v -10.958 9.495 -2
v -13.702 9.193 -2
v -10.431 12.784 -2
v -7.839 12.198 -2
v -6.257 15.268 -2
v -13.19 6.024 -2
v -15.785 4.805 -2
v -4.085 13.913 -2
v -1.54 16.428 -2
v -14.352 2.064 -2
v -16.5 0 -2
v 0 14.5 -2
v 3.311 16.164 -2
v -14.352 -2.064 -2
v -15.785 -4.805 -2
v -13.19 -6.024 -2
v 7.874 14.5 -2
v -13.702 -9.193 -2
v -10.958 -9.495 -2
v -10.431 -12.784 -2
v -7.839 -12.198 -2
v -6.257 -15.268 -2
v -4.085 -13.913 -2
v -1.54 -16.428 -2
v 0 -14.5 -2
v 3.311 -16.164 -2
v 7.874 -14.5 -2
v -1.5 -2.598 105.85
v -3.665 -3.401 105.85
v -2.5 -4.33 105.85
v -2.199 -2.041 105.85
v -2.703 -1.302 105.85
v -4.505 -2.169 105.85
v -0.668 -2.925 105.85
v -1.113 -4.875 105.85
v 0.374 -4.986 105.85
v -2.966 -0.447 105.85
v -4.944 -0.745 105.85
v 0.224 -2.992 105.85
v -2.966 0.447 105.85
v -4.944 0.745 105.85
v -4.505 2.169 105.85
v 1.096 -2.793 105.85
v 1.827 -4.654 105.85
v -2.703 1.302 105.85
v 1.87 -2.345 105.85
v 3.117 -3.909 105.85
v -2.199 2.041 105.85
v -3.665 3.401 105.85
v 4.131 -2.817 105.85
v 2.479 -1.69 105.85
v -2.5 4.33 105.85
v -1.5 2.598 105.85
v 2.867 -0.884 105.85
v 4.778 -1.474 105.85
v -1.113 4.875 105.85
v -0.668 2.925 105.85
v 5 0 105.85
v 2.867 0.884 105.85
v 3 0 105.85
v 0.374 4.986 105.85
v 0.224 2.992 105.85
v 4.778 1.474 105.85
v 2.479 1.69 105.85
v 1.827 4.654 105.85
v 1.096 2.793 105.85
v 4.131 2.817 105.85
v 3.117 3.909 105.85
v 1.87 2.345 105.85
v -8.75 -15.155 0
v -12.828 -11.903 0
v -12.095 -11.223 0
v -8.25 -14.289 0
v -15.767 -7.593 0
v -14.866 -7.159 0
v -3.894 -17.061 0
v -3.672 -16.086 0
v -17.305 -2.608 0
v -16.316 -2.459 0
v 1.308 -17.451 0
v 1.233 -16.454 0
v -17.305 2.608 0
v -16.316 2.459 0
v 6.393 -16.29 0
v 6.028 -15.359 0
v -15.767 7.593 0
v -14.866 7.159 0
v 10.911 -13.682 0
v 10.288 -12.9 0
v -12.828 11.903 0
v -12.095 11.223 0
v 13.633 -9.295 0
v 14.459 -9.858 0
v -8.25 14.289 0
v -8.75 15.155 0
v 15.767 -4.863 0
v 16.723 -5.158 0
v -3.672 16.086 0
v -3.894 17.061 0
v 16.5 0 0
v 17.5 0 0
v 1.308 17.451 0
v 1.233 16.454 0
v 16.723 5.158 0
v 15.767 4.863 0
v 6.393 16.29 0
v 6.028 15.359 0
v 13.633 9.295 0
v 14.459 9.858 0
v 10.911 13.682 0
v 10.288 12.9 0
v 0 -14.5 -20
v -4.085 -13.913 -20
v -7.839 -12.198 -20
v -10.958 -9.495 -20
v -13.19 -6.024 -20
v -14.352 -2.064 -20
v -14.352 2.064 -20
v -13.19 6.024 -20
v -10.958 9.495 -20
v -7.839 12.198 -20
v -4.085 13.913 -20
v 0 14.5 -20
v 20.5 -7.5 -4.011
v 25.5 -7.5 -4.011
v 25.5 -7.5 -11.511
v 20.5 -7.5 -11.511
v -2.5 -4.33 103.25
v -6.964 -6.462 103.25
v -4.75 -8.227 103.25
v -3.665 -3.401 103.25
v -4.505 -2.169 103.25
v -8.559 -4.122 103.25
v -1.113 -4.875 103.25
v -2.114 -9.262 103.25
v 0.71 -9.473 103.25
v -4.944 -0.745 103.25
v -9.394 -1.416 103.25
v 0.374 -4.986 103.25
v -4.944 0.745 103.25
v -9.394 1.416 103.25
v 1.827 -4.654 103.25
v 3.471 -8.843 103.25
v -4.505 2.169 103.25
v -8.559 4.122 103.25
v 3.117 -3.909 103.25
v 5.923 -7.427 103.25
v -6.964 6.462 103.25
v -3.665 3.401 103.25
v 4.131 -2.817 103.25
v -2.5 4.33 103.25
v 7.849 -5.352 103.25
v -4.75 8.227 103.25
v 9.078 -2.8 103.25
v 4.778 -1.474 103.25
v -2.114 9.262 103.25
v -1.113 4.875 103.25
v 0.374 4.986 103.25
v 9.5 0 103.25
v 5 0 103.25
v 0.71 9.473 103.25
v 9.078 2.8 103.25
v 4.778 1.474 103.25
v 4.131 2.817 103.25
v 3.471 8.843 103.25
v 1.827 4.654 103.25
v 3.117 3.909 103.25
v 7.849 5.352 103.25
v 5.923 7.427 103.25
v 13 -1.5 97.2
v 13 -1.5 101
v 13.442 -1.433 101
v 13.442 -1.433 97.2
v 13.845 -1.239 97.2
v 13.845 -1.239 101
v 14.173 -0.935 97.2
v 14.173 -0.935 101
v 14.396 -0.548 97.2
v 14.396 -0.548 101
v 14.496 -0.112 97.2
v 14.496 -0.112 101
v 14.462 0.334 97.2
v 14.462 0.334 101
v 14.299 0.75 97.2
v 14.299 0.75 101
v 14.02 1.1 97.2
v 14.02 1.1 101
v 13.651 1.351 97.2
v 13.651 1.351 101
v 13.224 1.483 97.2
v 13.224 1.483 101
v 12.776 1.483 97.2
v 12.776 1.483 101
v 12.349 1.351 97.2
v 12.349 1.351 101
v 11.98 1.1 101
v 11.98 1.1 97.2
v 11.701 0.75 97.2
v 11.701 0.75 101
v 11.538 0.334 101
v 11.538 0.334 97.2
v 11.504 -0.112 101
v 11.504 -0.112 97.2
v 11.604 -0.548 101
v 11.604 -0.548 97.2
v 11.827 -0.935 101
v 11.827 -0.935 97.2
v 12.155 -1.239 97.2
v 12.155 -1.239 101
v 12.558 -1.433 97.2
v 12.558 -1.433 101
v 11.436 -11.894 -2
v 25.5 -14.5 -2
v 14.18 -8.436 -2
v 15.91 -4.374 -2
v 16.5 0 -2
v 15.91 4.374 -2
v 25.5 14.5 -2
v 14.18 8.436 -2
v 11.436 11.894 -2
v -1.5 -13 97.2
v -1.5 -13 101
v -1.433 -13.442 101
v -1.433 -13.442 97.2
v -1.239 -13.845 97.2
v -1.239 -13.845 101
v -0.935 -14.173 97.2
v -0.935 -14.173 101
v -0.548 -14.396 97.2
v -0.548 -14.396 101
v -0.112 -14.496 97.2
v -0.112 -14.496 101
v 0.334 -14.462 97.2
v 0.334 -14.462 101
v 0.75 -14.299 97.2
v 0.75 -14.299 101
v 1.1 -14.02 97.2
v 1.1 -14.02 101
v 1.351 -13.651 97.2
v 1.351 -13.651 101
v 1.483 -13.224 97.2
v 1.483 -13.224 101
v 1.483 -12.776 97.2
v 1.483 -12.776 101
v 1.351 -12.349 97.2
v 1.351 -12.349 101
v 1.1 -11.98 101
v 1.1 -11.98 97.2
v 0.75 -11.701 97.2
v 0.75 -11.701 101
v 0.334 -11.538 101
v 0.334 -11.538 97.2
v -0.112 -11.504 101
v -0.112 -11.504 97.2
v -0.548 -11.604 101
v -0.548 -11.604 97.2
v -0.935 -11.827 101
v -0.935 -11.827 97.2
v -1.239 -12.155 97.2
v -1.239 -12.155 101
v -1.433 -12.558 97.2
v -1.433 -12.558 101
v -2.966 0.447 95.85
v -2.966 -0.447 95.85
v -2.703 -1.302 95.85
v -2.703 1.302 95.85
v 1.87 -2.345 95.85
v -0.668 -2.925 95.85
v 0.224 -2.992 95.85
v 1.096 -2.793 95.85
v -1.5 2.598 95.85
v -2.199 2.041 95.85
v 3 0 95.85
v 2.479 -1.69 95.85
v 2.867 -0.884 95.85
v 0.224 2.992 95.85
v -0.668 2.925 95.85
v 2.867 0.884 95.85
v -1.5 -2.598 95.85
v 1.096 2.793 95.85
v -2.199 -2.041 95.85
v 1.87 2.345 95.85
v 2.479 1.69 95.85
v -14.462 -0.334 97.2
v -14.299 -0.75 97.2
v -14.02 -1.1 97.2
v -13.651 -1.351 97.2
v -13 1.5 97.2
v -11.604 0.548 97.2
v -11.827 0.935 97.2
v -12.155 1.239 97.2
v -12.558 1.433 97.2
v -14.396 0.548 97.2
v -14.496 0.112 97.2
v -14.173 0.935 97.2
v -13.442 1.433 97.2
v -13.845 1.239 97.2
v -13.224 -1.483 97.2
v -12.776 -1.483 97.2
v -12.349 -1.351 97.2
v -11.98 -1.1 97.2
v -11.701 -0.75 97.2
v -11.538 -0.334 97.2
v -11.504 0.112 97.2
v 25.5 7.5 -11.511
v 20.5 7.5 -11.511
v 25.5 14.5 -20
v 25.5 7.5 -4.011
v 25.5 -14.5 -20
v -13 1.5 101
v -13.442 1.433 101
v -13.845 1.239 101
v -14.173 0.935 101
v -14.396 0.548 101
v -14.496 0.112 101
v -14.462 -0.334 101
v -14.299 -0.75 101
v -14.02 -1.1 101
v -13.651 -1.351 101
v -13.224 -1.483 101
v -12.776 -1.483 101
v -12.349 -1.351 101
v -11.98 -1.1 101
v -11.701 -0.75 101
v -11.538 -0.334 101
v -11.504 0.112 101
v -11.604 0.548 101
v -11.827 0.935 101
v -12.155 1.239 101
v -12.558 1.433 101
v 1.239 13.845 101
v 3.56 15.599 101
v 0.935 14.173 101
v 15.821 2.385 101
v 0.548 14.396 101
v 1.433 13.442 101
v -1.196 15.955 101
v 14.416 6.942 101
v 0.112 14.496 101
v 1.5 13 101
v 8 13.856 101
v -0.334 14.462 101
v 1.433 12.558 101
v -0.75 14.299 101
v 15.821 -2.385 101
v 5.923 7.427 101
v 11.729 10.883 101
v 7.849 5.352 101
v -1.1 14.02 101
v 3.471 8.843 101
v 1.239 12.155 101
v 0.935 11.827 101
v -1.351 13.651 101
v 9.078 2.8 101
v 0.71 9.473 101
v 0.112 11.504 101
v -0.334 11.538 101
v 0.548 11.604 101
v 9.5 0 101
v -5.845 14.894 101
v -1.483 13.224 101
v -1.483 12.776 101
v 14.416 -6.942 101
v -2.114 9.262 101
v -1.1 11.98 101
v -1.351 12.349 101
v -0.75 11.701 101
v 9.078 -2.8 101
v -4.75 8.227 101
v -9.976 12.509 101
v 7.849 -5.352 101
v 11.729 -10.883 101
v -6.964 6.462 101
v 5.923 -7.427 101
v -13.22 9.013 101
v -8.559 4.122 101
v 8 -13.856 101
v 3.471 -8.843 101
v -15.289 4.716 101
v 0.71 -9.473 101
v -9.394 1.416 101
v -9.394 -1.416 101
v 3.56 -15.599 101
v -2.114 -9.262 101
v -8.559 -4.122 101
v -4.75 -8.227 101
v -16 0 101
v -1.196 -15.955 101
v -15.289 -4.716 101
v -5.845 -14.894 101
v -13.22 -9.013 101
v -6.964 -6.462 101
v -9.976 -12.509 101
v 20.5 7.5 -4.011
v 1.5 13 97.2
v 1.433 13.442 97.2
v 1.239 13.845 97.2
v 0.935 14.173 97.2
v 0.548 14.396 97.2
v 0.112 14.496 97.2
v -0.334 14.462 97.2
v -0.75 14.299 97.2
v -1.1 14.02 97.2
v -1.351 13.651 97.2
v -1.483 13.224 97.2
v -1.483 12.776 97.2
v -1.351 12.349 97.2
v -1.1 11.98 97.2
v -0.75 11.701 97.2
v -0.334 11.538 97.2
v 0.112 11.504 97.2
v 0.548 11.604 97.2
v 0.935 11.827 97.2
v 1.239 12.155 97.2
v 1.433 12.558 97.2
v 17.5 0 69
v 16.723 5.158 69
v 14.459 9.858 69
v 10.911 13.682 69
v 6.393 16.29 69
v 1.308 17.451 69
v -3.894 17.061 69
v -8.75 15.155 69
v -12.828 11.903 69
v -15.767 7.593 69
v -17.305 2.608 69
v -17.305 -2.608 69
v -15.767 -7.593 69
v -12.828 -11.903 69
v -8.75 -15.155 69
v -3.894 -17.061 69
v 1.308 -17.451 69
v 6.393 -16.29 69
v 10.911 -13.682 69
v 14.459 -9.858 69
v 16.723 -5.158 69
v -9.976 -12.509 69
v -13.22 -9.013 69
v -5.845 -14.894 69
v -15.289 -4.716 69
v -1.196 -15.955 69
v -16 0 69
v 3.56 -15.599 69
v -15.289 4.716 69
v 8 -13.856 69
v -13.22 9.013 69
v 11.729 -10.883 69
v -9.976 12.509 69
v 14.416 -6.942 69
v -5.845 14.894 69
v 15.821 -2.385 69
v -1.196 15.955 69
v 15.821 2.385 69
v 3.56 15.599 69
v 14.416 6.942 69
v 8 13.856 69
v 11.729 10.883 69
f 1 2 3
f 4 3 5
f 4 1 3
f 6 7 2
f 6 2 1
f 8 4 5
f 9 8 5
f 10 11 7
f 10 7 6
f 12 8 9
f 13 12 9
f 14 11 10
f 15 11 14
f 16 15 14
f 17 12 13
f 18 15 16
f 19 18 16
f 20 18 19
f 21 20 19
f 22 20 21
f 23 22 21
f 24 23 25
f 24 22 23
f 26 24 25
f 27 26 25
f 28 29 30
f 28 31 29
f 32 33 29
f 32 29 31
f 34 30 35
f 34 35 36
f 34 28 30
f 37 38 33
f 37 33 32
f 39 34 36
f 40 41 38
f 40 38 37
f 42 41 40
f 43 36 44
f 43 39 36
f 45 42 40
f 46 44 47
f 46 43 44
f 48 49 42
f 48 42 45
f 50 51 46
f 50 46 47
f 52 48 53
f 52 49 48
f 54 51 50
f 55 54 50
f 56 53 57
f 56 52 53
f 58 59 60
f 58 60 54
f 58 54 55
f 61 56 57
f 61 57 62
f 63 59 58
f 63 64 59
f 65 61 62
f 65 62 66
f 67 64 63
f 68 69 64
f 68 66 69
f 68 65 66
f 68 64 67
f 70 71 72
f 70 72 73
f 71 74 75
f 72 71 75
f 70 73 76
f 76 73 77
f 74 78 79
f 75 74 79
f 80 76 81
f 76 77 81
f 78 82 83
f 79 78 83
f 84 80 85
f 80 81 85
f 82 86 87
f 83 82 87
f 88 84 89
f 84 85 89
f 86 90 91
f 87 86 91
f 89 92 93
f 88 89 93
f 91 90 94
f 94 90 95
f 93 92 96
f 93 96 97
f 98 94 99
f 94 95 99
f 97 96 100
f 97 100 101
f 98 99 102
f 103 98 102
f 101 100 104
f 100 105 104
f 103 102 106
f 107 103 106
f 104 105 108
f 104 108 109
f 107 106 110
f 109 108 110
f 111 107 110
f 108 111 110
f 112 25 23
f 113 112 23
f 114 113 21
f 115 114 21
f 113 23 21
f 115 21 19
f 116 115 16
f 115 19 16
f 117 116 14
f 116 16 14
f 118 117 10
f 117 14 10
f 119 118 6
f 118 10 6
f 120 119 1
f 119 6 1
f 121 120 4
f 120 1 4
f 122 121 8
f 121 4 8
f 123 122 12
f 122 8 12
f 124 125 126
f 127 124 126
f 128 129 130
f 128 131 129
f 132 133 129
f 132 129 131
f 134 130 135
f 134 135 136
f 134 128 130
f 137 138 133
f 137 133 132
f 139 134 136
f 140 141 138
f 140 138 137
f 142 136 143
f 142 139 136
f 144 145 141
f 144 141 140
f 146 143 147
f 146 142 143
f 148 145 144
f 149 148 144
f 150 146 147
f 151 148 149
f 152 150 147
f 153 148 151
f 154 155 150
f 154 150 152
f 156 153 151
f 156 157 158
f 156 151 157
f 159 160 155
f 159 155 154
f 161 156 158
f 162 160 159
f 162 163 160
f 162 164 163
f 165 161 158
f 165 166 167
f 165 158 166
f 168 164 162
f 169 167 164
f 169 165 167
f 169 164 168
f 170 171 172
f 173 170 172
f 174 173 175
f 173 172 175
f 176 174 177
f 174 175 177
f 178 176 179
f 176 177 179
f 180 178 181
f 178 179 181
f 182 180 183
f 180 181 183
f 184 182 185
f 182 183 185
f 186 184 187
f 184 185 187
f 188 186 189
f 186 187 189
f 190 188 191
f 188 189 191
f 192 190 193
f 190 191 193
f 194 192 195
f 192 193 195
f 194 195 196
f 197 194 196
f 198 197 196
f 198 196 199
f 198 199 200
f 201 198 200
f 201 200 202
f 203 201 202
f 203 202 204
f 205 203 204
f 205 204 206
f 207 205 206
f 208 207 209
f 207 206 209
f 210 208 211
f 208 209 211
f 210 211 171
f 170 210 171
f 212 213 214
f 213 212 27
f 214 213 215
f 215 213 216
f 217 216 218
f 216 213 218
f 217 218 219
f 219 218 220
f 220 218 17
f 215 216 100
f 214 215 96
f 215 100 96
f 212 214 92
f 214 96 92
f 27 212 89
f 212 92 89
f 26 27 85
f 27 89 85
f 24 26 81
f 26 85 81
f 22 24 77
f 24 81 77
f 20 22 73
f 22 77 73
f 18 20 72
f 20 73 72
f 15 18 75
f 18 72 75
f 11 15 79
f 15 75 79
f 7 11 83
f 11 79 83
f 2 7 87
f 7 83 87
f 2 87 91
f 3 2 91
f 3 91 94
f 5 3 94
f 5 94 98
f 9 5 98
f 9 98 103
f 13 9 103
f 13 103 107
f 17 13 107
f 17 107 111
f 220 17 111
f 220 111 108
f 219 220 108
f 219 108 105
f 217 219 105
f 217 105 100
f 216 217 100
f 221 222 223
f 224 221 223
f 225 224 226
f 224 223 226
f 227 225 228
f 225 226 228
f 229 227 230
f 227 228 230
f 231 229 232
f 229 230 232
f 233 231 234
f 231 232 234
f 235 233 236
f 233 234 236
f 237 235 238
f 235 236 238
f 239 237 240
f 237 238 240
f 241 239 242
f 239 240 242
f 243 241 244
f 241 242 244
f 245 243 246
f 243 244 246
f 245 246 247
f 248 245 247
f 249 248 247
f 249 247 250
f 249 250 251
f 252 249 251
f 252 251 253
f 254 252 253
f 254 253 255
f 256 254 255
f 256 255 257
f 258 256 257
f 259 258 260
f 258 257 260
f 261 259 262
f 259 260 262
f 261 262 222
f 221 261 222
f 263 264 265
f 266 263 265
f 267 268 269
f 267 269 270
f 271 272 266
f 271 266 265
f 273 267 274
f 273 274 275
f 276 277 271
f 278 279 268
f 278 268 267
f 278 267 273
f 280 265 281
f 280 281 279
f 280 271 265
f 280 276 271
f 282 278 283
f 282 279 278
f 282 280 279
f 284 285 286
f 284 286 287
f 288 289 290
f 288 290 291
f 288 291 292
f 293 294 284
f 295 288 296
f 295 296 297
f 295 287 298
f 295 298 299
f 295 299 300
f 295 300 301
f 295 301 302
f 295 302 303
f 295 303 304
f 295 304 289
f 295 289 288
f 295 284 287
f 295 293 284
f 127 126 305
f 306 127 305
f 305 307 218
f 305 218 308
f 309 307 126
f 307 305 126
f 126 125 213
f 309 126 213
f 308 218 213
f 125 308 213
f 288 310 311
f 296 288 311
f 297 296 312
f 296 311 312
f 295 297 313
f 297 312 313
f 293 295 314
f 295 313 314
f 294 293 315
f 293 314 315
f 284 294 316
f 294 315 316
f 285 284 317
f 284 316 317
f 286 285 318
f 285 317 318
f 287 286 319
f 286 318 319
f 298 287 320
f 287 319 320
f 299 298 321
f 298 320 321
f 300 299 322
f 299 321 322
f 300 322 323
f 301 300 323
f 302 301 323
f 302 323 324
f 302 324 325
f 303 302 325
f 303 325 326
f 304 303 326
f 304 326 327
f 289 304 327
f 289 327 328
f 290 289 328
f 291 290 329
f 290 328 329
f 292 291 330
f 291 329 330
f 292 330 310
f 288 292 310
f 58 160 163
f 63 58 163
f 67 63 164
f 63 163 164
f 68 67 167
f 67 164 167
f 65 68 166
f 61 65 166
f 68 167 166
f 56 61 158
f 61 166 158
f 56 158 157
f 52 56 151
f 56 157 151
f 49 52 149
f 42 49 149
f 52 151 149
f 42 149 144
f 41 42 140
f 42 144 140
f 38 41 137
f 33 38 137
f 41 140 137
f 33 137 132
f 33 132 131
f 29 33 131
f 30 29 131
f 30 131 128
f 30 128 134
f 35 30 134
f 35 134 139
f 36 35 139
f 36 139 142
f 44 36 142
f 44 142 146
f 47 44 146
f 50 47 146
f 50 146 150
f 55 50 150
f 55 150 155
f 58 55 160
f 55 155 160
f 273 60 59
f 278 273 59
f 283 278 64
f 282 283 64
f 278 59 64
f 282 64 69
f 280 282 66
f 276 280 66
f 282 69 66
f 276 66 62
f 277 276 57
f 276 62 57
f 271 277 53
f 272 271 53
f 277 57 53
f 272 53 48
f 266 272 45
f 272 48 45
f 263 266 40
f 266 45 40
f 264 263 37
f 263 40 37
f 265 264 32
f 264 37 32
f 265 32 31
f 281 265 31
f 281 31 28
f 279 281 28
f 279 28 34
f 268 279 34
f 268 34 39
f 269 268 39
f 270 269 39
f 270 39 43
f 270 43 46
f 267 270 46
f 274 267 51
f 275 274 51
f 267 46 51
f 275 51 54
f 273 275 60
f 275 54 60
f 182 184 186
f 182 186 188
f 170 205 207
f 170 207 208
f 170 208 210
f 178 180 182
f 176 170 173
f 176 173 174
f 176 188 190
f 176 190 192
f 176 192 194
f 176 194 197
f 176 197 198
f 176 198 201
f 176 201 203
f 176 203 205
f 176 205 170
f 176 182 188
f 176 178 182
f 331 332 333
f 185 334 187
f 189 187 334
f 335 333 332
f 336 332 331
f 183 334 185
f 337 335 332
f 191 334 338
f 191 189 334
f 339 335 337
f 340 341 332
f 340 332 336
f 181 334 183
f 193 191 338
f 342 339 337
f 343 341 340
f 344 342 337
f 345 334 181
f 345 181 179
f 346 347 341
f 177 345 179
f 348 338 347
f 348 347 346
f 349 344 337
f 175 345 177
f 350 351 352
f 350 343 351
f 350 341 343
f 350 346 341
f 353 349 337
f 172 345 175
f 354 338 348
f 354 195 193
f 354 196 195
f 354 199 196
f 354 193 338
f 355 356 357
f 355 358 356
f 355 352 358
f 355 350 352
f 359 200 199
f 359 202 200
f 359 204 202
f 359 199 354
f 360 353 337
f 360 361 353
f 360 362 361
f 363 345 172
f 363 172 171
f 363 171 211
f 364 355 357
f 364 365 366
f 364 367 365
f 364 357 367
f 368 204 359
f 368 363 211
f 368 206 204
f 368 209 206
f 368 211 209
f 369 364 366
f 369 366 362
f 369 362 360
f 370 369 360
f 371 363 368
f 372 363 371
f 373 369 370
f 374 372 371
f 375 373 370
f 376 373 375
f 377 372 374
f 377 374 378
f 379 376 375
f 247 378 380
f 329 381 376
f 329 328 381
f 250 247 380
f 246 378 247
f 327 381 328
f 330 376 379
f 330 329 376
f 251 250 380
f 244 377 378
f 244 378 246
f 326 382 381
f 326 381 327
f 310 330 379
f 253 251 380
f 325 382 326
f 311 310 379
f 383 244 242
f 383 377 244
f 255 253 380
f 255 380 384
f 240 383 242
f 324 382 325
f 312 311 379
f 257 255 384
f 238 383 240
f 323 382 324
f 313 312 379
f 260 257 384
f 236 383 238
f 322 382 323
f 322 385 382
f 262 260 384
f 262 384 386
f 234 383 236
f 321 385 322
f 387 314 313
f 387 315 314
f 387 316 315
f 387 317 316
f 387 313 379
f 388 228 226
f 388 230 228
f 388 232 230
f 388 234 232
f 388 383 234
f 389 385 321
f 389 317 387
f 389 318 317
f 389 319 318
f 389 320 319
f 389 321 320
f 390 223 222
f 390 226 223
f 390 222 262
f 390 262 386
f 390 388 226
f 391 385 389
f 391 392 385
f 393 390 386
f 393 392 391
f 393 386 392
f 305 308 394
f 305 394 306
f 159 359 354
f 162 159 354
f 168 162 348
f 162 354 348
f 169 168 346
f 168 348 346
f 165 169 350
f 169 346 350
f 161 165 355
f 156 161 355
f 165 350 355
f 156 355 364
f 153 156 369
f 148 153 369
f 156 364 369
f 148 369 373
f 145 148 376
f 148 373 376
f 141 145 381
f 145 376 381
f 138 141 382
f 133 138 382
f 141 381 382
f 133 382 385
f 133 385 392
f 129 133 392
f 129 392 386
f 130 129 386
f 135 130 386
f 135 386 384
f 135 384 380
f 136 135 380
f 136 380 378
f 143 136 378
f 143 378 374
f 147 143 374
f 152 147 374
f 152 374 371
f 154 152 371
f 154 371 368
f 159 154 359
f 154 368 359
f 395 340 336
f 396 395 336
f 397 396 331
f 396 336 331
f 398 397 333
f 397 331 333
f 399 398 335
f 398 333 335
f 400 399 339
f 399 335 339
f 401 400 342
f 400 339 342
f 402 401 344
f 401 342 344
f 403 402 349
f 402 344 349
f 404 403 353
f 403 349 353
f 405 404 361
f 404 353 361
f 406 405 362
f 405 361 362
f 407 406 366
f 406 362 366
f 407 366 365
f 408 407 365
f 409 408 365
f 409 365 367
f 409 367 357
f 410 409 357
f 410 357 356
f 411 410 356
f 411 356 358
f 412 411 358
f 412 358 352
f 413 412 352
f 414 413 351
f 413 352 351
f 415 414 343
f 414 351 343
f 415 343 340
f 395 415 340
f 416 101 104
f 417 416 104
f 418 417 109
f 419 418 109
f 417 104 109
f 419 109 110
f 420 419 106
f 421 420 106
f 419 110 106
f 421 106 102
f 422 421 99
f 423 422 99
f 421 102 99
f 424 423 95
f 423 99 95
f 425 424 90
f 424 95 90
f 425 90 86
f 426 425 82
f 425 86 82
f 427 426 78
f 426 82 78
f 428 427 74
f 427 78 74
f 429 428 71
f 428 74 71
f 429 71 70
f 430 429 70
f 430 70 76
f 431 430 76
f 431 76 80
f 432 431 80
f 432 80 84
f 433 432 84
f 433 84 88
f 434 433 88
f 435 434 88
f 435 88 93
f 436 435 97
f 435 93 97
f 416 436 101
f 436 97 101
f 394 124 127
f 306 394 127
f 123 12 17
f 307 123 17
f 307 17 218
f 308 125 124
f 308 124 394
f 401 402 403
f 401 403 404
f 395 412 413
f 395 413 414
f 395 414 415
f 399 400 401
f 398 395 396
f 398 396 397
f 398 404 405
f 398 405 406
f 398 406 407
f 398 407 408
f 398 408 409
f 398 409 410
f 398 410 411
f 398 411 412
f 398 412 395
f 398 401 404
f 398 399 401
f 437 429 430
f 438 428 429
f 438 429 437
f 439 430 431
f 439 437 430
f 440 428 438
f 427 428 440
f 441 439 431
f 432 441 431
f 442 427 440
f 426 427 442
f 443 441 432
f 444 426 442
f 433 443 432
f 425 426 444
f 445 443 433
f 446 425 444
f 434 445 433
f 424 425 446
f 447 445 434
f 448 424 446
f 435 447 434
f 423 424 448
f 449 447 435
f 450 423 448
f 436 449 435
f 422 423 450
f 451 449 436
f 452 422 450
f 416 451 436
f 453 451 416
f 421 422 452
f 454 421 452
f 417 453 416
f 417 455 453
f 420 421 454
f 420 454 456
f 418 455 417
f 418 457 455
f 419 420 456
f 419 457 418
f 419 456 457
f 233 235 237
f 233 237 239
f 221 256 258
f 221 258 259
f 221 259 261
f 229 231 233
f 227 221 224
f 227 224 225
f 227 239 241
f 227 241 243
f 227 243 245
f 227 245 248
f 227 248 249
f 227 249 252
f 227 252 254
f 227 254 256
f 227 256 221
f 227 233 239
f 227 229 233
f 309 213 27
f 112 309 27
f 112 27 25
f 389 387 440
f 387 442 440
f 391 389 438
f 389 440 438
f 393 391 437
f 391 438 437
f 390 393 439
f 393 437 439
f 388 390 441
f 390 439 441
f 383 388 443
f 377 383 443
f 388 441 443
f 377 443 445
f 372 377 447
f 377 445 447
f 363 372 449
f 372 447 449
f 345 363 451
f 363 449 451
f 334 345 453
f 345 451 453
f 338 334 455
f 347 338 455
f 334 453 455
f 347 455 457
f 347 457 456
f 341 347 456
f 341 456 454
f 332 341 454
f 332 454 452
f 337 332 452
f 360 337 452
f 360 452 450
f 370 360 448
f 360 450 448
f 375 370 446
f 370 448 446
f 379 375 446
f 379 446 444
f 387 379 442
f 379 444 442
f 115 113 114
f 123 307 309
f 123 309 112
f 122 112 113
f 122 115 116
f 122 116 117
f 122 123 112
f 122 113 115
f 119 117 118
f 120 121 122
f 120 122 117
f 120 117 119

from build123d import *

# Parameters (mm, degrees)
SKETCH_1_R               = 17.5
EXTRUDE_1_DEPTH          = 69
SKETCH_2_R               = 16
EXTRUDE_2_DEPTH          = 26
SKETCH_3_R               = 16
EXTRUDE_3_DEPTH          = 6
SKETCH_4_R               = 9.5
EXTRUDE_4_DEPTH          = 2.25
SKETCH_5_R               = 5
EXTRUDE_5_DEPTH          = 2.6
SKETCH_8_R               = 16.5
EXTRUDE_7_DEPTH          = 2
EXTRUDE_8_DEPTH          = 18
SKETCH_10_W              = 7.5
SKETCH_10_H              = 15
CUT_EXTRUDE_2_DEPTH      = 5
SKETCH_7_R               = 1.5
CUT_EXTRUDE_1_DEPTH      = 3.8
PATTERN_CIRCULAR_1_COUNT = 4
SKETCH_6_R               = 3
CUT_EXTRUDE_3_DEPTH      = 10


with BuildPart() as part:
    # 스케치1 → 보스-돌출1 (new body)
    with BuildSketch(Plane.XY):
        Circle(SKETCH_1_R)
    extrude(amount=EXTRUDE_1_DEPTH)

    # 스케치2 → 보스-돌출2 (add)
    with BuildSketch(Plane.XY.offset(69)):
        with Locations(Location((0, 0, 0), (0, 0, 180))):
            Circle(SKETCH_2_R)
    extrude(amount=EXTRUDE_2_DEPTH)

    # 스케치3 → 보스-돌출3 (add)
    with BuildSketch(Plane.XY.offset(95)):
        with Locations(Location((0, 0, 0), (0, 0, 180))):
            Circle(SKETCH_3_R)
    extrude(amount=EXTRUDE_3_DEPTH)

    # 스케치4 → 보스-돌출4 (add)
    with BuildSketch(Plane.XY.offset(101)):
        Circle(SKETCH_4_R)
    extrude(amount=EXTRUDE_4_DEPTH)

    # 스케치5 → 보스-돌출5 (add)
    with BuildSketch(Plane.XY.offset(103.25)):
        Circle(SKETCH_5_R)
    extrude(amount=EXTRUDE_5_DEPTH)

    # 스케치8 → 보스-돌출7 (add)
    with BuildSketch(Plane(origin=(0, 0, 0), x_dir=(-1, 0, 0), z_dir=(0, 0, -1))):
        with Locations(Location((0, 0, 0), (0, 0, 180))):
            Circle(SKETCH_8_R)
    extrude(amount=EXTRUDE_7_DEPTH)

    # 스케치9 → 보스-돌출8 (add)
    with BuildSketch(Plane(origin=(0, 0, -2), x_dir=(-1, 0, 0), z_dir=(0, 0, -1))):
        with BuildLine():
            Line((0, 14.5), (-25.5, 14.5))
            Line((-25.5, 14.5), (-25.5, -14.5))
            Line((-25.5, -14.5), (0, -14.5))
            ThreePointArc((0, -14.5), (14.5, 0), (0, 14.5))
        make_face()
    extrude(amount=EXTRUDE_8_DEPTH)

    # 스케치10 → 컷-돌출2 (cut)
    with BuildSketch(Plane(origin=(25.5, 0, 0), x_dir=(0, 0, -1), z_dir=(1, 0, 0))):
        with Locations((7.760897897, 0)):
            Rectangle(SKETCH_10_W, SKETCH_10_H)
    extrude(amount=-CUT_EXTRUDE_2_DEPTH, mode=Mode.SUBTRACT)

    # 스케치7 → 컷-돌출1 (cut)
    with BuildSketch(Plane.XY.offset(101)):
        with Locations((0, 13)):
            Circle(SKETCH_7_R)
    cut_extrude_1 = extrude(amount=-CUT_EXTRUDE_1_DEPTH, mode=Mode.SUBTRACT)

    # 원형 패턴1: 컷-돌출1 ×4 about axis
    pattern_circular_1_axis = Axis((0, 0, 0), (0, 0, 1))
    for i in range(1, PATTERN_CIRCULAR_1_COUNT):
        add(cut_extrude_1.rotate(pattern_circular_1_axis, i * 360 / PATTERN_CIRCULAR_1_COUNT), mode=Mode.SUBTRACT)

    # 스케치6 → 컷-돌출3 (cut)
    with BuildSketch(Plane.XY.offset(105.85)):
        Circle(SKETCH_6_R)
    extrude(amount=-CUT_EXTRUDE_3_DEPTH, mode=Mode.SUBTRACT)


solid = part.part
